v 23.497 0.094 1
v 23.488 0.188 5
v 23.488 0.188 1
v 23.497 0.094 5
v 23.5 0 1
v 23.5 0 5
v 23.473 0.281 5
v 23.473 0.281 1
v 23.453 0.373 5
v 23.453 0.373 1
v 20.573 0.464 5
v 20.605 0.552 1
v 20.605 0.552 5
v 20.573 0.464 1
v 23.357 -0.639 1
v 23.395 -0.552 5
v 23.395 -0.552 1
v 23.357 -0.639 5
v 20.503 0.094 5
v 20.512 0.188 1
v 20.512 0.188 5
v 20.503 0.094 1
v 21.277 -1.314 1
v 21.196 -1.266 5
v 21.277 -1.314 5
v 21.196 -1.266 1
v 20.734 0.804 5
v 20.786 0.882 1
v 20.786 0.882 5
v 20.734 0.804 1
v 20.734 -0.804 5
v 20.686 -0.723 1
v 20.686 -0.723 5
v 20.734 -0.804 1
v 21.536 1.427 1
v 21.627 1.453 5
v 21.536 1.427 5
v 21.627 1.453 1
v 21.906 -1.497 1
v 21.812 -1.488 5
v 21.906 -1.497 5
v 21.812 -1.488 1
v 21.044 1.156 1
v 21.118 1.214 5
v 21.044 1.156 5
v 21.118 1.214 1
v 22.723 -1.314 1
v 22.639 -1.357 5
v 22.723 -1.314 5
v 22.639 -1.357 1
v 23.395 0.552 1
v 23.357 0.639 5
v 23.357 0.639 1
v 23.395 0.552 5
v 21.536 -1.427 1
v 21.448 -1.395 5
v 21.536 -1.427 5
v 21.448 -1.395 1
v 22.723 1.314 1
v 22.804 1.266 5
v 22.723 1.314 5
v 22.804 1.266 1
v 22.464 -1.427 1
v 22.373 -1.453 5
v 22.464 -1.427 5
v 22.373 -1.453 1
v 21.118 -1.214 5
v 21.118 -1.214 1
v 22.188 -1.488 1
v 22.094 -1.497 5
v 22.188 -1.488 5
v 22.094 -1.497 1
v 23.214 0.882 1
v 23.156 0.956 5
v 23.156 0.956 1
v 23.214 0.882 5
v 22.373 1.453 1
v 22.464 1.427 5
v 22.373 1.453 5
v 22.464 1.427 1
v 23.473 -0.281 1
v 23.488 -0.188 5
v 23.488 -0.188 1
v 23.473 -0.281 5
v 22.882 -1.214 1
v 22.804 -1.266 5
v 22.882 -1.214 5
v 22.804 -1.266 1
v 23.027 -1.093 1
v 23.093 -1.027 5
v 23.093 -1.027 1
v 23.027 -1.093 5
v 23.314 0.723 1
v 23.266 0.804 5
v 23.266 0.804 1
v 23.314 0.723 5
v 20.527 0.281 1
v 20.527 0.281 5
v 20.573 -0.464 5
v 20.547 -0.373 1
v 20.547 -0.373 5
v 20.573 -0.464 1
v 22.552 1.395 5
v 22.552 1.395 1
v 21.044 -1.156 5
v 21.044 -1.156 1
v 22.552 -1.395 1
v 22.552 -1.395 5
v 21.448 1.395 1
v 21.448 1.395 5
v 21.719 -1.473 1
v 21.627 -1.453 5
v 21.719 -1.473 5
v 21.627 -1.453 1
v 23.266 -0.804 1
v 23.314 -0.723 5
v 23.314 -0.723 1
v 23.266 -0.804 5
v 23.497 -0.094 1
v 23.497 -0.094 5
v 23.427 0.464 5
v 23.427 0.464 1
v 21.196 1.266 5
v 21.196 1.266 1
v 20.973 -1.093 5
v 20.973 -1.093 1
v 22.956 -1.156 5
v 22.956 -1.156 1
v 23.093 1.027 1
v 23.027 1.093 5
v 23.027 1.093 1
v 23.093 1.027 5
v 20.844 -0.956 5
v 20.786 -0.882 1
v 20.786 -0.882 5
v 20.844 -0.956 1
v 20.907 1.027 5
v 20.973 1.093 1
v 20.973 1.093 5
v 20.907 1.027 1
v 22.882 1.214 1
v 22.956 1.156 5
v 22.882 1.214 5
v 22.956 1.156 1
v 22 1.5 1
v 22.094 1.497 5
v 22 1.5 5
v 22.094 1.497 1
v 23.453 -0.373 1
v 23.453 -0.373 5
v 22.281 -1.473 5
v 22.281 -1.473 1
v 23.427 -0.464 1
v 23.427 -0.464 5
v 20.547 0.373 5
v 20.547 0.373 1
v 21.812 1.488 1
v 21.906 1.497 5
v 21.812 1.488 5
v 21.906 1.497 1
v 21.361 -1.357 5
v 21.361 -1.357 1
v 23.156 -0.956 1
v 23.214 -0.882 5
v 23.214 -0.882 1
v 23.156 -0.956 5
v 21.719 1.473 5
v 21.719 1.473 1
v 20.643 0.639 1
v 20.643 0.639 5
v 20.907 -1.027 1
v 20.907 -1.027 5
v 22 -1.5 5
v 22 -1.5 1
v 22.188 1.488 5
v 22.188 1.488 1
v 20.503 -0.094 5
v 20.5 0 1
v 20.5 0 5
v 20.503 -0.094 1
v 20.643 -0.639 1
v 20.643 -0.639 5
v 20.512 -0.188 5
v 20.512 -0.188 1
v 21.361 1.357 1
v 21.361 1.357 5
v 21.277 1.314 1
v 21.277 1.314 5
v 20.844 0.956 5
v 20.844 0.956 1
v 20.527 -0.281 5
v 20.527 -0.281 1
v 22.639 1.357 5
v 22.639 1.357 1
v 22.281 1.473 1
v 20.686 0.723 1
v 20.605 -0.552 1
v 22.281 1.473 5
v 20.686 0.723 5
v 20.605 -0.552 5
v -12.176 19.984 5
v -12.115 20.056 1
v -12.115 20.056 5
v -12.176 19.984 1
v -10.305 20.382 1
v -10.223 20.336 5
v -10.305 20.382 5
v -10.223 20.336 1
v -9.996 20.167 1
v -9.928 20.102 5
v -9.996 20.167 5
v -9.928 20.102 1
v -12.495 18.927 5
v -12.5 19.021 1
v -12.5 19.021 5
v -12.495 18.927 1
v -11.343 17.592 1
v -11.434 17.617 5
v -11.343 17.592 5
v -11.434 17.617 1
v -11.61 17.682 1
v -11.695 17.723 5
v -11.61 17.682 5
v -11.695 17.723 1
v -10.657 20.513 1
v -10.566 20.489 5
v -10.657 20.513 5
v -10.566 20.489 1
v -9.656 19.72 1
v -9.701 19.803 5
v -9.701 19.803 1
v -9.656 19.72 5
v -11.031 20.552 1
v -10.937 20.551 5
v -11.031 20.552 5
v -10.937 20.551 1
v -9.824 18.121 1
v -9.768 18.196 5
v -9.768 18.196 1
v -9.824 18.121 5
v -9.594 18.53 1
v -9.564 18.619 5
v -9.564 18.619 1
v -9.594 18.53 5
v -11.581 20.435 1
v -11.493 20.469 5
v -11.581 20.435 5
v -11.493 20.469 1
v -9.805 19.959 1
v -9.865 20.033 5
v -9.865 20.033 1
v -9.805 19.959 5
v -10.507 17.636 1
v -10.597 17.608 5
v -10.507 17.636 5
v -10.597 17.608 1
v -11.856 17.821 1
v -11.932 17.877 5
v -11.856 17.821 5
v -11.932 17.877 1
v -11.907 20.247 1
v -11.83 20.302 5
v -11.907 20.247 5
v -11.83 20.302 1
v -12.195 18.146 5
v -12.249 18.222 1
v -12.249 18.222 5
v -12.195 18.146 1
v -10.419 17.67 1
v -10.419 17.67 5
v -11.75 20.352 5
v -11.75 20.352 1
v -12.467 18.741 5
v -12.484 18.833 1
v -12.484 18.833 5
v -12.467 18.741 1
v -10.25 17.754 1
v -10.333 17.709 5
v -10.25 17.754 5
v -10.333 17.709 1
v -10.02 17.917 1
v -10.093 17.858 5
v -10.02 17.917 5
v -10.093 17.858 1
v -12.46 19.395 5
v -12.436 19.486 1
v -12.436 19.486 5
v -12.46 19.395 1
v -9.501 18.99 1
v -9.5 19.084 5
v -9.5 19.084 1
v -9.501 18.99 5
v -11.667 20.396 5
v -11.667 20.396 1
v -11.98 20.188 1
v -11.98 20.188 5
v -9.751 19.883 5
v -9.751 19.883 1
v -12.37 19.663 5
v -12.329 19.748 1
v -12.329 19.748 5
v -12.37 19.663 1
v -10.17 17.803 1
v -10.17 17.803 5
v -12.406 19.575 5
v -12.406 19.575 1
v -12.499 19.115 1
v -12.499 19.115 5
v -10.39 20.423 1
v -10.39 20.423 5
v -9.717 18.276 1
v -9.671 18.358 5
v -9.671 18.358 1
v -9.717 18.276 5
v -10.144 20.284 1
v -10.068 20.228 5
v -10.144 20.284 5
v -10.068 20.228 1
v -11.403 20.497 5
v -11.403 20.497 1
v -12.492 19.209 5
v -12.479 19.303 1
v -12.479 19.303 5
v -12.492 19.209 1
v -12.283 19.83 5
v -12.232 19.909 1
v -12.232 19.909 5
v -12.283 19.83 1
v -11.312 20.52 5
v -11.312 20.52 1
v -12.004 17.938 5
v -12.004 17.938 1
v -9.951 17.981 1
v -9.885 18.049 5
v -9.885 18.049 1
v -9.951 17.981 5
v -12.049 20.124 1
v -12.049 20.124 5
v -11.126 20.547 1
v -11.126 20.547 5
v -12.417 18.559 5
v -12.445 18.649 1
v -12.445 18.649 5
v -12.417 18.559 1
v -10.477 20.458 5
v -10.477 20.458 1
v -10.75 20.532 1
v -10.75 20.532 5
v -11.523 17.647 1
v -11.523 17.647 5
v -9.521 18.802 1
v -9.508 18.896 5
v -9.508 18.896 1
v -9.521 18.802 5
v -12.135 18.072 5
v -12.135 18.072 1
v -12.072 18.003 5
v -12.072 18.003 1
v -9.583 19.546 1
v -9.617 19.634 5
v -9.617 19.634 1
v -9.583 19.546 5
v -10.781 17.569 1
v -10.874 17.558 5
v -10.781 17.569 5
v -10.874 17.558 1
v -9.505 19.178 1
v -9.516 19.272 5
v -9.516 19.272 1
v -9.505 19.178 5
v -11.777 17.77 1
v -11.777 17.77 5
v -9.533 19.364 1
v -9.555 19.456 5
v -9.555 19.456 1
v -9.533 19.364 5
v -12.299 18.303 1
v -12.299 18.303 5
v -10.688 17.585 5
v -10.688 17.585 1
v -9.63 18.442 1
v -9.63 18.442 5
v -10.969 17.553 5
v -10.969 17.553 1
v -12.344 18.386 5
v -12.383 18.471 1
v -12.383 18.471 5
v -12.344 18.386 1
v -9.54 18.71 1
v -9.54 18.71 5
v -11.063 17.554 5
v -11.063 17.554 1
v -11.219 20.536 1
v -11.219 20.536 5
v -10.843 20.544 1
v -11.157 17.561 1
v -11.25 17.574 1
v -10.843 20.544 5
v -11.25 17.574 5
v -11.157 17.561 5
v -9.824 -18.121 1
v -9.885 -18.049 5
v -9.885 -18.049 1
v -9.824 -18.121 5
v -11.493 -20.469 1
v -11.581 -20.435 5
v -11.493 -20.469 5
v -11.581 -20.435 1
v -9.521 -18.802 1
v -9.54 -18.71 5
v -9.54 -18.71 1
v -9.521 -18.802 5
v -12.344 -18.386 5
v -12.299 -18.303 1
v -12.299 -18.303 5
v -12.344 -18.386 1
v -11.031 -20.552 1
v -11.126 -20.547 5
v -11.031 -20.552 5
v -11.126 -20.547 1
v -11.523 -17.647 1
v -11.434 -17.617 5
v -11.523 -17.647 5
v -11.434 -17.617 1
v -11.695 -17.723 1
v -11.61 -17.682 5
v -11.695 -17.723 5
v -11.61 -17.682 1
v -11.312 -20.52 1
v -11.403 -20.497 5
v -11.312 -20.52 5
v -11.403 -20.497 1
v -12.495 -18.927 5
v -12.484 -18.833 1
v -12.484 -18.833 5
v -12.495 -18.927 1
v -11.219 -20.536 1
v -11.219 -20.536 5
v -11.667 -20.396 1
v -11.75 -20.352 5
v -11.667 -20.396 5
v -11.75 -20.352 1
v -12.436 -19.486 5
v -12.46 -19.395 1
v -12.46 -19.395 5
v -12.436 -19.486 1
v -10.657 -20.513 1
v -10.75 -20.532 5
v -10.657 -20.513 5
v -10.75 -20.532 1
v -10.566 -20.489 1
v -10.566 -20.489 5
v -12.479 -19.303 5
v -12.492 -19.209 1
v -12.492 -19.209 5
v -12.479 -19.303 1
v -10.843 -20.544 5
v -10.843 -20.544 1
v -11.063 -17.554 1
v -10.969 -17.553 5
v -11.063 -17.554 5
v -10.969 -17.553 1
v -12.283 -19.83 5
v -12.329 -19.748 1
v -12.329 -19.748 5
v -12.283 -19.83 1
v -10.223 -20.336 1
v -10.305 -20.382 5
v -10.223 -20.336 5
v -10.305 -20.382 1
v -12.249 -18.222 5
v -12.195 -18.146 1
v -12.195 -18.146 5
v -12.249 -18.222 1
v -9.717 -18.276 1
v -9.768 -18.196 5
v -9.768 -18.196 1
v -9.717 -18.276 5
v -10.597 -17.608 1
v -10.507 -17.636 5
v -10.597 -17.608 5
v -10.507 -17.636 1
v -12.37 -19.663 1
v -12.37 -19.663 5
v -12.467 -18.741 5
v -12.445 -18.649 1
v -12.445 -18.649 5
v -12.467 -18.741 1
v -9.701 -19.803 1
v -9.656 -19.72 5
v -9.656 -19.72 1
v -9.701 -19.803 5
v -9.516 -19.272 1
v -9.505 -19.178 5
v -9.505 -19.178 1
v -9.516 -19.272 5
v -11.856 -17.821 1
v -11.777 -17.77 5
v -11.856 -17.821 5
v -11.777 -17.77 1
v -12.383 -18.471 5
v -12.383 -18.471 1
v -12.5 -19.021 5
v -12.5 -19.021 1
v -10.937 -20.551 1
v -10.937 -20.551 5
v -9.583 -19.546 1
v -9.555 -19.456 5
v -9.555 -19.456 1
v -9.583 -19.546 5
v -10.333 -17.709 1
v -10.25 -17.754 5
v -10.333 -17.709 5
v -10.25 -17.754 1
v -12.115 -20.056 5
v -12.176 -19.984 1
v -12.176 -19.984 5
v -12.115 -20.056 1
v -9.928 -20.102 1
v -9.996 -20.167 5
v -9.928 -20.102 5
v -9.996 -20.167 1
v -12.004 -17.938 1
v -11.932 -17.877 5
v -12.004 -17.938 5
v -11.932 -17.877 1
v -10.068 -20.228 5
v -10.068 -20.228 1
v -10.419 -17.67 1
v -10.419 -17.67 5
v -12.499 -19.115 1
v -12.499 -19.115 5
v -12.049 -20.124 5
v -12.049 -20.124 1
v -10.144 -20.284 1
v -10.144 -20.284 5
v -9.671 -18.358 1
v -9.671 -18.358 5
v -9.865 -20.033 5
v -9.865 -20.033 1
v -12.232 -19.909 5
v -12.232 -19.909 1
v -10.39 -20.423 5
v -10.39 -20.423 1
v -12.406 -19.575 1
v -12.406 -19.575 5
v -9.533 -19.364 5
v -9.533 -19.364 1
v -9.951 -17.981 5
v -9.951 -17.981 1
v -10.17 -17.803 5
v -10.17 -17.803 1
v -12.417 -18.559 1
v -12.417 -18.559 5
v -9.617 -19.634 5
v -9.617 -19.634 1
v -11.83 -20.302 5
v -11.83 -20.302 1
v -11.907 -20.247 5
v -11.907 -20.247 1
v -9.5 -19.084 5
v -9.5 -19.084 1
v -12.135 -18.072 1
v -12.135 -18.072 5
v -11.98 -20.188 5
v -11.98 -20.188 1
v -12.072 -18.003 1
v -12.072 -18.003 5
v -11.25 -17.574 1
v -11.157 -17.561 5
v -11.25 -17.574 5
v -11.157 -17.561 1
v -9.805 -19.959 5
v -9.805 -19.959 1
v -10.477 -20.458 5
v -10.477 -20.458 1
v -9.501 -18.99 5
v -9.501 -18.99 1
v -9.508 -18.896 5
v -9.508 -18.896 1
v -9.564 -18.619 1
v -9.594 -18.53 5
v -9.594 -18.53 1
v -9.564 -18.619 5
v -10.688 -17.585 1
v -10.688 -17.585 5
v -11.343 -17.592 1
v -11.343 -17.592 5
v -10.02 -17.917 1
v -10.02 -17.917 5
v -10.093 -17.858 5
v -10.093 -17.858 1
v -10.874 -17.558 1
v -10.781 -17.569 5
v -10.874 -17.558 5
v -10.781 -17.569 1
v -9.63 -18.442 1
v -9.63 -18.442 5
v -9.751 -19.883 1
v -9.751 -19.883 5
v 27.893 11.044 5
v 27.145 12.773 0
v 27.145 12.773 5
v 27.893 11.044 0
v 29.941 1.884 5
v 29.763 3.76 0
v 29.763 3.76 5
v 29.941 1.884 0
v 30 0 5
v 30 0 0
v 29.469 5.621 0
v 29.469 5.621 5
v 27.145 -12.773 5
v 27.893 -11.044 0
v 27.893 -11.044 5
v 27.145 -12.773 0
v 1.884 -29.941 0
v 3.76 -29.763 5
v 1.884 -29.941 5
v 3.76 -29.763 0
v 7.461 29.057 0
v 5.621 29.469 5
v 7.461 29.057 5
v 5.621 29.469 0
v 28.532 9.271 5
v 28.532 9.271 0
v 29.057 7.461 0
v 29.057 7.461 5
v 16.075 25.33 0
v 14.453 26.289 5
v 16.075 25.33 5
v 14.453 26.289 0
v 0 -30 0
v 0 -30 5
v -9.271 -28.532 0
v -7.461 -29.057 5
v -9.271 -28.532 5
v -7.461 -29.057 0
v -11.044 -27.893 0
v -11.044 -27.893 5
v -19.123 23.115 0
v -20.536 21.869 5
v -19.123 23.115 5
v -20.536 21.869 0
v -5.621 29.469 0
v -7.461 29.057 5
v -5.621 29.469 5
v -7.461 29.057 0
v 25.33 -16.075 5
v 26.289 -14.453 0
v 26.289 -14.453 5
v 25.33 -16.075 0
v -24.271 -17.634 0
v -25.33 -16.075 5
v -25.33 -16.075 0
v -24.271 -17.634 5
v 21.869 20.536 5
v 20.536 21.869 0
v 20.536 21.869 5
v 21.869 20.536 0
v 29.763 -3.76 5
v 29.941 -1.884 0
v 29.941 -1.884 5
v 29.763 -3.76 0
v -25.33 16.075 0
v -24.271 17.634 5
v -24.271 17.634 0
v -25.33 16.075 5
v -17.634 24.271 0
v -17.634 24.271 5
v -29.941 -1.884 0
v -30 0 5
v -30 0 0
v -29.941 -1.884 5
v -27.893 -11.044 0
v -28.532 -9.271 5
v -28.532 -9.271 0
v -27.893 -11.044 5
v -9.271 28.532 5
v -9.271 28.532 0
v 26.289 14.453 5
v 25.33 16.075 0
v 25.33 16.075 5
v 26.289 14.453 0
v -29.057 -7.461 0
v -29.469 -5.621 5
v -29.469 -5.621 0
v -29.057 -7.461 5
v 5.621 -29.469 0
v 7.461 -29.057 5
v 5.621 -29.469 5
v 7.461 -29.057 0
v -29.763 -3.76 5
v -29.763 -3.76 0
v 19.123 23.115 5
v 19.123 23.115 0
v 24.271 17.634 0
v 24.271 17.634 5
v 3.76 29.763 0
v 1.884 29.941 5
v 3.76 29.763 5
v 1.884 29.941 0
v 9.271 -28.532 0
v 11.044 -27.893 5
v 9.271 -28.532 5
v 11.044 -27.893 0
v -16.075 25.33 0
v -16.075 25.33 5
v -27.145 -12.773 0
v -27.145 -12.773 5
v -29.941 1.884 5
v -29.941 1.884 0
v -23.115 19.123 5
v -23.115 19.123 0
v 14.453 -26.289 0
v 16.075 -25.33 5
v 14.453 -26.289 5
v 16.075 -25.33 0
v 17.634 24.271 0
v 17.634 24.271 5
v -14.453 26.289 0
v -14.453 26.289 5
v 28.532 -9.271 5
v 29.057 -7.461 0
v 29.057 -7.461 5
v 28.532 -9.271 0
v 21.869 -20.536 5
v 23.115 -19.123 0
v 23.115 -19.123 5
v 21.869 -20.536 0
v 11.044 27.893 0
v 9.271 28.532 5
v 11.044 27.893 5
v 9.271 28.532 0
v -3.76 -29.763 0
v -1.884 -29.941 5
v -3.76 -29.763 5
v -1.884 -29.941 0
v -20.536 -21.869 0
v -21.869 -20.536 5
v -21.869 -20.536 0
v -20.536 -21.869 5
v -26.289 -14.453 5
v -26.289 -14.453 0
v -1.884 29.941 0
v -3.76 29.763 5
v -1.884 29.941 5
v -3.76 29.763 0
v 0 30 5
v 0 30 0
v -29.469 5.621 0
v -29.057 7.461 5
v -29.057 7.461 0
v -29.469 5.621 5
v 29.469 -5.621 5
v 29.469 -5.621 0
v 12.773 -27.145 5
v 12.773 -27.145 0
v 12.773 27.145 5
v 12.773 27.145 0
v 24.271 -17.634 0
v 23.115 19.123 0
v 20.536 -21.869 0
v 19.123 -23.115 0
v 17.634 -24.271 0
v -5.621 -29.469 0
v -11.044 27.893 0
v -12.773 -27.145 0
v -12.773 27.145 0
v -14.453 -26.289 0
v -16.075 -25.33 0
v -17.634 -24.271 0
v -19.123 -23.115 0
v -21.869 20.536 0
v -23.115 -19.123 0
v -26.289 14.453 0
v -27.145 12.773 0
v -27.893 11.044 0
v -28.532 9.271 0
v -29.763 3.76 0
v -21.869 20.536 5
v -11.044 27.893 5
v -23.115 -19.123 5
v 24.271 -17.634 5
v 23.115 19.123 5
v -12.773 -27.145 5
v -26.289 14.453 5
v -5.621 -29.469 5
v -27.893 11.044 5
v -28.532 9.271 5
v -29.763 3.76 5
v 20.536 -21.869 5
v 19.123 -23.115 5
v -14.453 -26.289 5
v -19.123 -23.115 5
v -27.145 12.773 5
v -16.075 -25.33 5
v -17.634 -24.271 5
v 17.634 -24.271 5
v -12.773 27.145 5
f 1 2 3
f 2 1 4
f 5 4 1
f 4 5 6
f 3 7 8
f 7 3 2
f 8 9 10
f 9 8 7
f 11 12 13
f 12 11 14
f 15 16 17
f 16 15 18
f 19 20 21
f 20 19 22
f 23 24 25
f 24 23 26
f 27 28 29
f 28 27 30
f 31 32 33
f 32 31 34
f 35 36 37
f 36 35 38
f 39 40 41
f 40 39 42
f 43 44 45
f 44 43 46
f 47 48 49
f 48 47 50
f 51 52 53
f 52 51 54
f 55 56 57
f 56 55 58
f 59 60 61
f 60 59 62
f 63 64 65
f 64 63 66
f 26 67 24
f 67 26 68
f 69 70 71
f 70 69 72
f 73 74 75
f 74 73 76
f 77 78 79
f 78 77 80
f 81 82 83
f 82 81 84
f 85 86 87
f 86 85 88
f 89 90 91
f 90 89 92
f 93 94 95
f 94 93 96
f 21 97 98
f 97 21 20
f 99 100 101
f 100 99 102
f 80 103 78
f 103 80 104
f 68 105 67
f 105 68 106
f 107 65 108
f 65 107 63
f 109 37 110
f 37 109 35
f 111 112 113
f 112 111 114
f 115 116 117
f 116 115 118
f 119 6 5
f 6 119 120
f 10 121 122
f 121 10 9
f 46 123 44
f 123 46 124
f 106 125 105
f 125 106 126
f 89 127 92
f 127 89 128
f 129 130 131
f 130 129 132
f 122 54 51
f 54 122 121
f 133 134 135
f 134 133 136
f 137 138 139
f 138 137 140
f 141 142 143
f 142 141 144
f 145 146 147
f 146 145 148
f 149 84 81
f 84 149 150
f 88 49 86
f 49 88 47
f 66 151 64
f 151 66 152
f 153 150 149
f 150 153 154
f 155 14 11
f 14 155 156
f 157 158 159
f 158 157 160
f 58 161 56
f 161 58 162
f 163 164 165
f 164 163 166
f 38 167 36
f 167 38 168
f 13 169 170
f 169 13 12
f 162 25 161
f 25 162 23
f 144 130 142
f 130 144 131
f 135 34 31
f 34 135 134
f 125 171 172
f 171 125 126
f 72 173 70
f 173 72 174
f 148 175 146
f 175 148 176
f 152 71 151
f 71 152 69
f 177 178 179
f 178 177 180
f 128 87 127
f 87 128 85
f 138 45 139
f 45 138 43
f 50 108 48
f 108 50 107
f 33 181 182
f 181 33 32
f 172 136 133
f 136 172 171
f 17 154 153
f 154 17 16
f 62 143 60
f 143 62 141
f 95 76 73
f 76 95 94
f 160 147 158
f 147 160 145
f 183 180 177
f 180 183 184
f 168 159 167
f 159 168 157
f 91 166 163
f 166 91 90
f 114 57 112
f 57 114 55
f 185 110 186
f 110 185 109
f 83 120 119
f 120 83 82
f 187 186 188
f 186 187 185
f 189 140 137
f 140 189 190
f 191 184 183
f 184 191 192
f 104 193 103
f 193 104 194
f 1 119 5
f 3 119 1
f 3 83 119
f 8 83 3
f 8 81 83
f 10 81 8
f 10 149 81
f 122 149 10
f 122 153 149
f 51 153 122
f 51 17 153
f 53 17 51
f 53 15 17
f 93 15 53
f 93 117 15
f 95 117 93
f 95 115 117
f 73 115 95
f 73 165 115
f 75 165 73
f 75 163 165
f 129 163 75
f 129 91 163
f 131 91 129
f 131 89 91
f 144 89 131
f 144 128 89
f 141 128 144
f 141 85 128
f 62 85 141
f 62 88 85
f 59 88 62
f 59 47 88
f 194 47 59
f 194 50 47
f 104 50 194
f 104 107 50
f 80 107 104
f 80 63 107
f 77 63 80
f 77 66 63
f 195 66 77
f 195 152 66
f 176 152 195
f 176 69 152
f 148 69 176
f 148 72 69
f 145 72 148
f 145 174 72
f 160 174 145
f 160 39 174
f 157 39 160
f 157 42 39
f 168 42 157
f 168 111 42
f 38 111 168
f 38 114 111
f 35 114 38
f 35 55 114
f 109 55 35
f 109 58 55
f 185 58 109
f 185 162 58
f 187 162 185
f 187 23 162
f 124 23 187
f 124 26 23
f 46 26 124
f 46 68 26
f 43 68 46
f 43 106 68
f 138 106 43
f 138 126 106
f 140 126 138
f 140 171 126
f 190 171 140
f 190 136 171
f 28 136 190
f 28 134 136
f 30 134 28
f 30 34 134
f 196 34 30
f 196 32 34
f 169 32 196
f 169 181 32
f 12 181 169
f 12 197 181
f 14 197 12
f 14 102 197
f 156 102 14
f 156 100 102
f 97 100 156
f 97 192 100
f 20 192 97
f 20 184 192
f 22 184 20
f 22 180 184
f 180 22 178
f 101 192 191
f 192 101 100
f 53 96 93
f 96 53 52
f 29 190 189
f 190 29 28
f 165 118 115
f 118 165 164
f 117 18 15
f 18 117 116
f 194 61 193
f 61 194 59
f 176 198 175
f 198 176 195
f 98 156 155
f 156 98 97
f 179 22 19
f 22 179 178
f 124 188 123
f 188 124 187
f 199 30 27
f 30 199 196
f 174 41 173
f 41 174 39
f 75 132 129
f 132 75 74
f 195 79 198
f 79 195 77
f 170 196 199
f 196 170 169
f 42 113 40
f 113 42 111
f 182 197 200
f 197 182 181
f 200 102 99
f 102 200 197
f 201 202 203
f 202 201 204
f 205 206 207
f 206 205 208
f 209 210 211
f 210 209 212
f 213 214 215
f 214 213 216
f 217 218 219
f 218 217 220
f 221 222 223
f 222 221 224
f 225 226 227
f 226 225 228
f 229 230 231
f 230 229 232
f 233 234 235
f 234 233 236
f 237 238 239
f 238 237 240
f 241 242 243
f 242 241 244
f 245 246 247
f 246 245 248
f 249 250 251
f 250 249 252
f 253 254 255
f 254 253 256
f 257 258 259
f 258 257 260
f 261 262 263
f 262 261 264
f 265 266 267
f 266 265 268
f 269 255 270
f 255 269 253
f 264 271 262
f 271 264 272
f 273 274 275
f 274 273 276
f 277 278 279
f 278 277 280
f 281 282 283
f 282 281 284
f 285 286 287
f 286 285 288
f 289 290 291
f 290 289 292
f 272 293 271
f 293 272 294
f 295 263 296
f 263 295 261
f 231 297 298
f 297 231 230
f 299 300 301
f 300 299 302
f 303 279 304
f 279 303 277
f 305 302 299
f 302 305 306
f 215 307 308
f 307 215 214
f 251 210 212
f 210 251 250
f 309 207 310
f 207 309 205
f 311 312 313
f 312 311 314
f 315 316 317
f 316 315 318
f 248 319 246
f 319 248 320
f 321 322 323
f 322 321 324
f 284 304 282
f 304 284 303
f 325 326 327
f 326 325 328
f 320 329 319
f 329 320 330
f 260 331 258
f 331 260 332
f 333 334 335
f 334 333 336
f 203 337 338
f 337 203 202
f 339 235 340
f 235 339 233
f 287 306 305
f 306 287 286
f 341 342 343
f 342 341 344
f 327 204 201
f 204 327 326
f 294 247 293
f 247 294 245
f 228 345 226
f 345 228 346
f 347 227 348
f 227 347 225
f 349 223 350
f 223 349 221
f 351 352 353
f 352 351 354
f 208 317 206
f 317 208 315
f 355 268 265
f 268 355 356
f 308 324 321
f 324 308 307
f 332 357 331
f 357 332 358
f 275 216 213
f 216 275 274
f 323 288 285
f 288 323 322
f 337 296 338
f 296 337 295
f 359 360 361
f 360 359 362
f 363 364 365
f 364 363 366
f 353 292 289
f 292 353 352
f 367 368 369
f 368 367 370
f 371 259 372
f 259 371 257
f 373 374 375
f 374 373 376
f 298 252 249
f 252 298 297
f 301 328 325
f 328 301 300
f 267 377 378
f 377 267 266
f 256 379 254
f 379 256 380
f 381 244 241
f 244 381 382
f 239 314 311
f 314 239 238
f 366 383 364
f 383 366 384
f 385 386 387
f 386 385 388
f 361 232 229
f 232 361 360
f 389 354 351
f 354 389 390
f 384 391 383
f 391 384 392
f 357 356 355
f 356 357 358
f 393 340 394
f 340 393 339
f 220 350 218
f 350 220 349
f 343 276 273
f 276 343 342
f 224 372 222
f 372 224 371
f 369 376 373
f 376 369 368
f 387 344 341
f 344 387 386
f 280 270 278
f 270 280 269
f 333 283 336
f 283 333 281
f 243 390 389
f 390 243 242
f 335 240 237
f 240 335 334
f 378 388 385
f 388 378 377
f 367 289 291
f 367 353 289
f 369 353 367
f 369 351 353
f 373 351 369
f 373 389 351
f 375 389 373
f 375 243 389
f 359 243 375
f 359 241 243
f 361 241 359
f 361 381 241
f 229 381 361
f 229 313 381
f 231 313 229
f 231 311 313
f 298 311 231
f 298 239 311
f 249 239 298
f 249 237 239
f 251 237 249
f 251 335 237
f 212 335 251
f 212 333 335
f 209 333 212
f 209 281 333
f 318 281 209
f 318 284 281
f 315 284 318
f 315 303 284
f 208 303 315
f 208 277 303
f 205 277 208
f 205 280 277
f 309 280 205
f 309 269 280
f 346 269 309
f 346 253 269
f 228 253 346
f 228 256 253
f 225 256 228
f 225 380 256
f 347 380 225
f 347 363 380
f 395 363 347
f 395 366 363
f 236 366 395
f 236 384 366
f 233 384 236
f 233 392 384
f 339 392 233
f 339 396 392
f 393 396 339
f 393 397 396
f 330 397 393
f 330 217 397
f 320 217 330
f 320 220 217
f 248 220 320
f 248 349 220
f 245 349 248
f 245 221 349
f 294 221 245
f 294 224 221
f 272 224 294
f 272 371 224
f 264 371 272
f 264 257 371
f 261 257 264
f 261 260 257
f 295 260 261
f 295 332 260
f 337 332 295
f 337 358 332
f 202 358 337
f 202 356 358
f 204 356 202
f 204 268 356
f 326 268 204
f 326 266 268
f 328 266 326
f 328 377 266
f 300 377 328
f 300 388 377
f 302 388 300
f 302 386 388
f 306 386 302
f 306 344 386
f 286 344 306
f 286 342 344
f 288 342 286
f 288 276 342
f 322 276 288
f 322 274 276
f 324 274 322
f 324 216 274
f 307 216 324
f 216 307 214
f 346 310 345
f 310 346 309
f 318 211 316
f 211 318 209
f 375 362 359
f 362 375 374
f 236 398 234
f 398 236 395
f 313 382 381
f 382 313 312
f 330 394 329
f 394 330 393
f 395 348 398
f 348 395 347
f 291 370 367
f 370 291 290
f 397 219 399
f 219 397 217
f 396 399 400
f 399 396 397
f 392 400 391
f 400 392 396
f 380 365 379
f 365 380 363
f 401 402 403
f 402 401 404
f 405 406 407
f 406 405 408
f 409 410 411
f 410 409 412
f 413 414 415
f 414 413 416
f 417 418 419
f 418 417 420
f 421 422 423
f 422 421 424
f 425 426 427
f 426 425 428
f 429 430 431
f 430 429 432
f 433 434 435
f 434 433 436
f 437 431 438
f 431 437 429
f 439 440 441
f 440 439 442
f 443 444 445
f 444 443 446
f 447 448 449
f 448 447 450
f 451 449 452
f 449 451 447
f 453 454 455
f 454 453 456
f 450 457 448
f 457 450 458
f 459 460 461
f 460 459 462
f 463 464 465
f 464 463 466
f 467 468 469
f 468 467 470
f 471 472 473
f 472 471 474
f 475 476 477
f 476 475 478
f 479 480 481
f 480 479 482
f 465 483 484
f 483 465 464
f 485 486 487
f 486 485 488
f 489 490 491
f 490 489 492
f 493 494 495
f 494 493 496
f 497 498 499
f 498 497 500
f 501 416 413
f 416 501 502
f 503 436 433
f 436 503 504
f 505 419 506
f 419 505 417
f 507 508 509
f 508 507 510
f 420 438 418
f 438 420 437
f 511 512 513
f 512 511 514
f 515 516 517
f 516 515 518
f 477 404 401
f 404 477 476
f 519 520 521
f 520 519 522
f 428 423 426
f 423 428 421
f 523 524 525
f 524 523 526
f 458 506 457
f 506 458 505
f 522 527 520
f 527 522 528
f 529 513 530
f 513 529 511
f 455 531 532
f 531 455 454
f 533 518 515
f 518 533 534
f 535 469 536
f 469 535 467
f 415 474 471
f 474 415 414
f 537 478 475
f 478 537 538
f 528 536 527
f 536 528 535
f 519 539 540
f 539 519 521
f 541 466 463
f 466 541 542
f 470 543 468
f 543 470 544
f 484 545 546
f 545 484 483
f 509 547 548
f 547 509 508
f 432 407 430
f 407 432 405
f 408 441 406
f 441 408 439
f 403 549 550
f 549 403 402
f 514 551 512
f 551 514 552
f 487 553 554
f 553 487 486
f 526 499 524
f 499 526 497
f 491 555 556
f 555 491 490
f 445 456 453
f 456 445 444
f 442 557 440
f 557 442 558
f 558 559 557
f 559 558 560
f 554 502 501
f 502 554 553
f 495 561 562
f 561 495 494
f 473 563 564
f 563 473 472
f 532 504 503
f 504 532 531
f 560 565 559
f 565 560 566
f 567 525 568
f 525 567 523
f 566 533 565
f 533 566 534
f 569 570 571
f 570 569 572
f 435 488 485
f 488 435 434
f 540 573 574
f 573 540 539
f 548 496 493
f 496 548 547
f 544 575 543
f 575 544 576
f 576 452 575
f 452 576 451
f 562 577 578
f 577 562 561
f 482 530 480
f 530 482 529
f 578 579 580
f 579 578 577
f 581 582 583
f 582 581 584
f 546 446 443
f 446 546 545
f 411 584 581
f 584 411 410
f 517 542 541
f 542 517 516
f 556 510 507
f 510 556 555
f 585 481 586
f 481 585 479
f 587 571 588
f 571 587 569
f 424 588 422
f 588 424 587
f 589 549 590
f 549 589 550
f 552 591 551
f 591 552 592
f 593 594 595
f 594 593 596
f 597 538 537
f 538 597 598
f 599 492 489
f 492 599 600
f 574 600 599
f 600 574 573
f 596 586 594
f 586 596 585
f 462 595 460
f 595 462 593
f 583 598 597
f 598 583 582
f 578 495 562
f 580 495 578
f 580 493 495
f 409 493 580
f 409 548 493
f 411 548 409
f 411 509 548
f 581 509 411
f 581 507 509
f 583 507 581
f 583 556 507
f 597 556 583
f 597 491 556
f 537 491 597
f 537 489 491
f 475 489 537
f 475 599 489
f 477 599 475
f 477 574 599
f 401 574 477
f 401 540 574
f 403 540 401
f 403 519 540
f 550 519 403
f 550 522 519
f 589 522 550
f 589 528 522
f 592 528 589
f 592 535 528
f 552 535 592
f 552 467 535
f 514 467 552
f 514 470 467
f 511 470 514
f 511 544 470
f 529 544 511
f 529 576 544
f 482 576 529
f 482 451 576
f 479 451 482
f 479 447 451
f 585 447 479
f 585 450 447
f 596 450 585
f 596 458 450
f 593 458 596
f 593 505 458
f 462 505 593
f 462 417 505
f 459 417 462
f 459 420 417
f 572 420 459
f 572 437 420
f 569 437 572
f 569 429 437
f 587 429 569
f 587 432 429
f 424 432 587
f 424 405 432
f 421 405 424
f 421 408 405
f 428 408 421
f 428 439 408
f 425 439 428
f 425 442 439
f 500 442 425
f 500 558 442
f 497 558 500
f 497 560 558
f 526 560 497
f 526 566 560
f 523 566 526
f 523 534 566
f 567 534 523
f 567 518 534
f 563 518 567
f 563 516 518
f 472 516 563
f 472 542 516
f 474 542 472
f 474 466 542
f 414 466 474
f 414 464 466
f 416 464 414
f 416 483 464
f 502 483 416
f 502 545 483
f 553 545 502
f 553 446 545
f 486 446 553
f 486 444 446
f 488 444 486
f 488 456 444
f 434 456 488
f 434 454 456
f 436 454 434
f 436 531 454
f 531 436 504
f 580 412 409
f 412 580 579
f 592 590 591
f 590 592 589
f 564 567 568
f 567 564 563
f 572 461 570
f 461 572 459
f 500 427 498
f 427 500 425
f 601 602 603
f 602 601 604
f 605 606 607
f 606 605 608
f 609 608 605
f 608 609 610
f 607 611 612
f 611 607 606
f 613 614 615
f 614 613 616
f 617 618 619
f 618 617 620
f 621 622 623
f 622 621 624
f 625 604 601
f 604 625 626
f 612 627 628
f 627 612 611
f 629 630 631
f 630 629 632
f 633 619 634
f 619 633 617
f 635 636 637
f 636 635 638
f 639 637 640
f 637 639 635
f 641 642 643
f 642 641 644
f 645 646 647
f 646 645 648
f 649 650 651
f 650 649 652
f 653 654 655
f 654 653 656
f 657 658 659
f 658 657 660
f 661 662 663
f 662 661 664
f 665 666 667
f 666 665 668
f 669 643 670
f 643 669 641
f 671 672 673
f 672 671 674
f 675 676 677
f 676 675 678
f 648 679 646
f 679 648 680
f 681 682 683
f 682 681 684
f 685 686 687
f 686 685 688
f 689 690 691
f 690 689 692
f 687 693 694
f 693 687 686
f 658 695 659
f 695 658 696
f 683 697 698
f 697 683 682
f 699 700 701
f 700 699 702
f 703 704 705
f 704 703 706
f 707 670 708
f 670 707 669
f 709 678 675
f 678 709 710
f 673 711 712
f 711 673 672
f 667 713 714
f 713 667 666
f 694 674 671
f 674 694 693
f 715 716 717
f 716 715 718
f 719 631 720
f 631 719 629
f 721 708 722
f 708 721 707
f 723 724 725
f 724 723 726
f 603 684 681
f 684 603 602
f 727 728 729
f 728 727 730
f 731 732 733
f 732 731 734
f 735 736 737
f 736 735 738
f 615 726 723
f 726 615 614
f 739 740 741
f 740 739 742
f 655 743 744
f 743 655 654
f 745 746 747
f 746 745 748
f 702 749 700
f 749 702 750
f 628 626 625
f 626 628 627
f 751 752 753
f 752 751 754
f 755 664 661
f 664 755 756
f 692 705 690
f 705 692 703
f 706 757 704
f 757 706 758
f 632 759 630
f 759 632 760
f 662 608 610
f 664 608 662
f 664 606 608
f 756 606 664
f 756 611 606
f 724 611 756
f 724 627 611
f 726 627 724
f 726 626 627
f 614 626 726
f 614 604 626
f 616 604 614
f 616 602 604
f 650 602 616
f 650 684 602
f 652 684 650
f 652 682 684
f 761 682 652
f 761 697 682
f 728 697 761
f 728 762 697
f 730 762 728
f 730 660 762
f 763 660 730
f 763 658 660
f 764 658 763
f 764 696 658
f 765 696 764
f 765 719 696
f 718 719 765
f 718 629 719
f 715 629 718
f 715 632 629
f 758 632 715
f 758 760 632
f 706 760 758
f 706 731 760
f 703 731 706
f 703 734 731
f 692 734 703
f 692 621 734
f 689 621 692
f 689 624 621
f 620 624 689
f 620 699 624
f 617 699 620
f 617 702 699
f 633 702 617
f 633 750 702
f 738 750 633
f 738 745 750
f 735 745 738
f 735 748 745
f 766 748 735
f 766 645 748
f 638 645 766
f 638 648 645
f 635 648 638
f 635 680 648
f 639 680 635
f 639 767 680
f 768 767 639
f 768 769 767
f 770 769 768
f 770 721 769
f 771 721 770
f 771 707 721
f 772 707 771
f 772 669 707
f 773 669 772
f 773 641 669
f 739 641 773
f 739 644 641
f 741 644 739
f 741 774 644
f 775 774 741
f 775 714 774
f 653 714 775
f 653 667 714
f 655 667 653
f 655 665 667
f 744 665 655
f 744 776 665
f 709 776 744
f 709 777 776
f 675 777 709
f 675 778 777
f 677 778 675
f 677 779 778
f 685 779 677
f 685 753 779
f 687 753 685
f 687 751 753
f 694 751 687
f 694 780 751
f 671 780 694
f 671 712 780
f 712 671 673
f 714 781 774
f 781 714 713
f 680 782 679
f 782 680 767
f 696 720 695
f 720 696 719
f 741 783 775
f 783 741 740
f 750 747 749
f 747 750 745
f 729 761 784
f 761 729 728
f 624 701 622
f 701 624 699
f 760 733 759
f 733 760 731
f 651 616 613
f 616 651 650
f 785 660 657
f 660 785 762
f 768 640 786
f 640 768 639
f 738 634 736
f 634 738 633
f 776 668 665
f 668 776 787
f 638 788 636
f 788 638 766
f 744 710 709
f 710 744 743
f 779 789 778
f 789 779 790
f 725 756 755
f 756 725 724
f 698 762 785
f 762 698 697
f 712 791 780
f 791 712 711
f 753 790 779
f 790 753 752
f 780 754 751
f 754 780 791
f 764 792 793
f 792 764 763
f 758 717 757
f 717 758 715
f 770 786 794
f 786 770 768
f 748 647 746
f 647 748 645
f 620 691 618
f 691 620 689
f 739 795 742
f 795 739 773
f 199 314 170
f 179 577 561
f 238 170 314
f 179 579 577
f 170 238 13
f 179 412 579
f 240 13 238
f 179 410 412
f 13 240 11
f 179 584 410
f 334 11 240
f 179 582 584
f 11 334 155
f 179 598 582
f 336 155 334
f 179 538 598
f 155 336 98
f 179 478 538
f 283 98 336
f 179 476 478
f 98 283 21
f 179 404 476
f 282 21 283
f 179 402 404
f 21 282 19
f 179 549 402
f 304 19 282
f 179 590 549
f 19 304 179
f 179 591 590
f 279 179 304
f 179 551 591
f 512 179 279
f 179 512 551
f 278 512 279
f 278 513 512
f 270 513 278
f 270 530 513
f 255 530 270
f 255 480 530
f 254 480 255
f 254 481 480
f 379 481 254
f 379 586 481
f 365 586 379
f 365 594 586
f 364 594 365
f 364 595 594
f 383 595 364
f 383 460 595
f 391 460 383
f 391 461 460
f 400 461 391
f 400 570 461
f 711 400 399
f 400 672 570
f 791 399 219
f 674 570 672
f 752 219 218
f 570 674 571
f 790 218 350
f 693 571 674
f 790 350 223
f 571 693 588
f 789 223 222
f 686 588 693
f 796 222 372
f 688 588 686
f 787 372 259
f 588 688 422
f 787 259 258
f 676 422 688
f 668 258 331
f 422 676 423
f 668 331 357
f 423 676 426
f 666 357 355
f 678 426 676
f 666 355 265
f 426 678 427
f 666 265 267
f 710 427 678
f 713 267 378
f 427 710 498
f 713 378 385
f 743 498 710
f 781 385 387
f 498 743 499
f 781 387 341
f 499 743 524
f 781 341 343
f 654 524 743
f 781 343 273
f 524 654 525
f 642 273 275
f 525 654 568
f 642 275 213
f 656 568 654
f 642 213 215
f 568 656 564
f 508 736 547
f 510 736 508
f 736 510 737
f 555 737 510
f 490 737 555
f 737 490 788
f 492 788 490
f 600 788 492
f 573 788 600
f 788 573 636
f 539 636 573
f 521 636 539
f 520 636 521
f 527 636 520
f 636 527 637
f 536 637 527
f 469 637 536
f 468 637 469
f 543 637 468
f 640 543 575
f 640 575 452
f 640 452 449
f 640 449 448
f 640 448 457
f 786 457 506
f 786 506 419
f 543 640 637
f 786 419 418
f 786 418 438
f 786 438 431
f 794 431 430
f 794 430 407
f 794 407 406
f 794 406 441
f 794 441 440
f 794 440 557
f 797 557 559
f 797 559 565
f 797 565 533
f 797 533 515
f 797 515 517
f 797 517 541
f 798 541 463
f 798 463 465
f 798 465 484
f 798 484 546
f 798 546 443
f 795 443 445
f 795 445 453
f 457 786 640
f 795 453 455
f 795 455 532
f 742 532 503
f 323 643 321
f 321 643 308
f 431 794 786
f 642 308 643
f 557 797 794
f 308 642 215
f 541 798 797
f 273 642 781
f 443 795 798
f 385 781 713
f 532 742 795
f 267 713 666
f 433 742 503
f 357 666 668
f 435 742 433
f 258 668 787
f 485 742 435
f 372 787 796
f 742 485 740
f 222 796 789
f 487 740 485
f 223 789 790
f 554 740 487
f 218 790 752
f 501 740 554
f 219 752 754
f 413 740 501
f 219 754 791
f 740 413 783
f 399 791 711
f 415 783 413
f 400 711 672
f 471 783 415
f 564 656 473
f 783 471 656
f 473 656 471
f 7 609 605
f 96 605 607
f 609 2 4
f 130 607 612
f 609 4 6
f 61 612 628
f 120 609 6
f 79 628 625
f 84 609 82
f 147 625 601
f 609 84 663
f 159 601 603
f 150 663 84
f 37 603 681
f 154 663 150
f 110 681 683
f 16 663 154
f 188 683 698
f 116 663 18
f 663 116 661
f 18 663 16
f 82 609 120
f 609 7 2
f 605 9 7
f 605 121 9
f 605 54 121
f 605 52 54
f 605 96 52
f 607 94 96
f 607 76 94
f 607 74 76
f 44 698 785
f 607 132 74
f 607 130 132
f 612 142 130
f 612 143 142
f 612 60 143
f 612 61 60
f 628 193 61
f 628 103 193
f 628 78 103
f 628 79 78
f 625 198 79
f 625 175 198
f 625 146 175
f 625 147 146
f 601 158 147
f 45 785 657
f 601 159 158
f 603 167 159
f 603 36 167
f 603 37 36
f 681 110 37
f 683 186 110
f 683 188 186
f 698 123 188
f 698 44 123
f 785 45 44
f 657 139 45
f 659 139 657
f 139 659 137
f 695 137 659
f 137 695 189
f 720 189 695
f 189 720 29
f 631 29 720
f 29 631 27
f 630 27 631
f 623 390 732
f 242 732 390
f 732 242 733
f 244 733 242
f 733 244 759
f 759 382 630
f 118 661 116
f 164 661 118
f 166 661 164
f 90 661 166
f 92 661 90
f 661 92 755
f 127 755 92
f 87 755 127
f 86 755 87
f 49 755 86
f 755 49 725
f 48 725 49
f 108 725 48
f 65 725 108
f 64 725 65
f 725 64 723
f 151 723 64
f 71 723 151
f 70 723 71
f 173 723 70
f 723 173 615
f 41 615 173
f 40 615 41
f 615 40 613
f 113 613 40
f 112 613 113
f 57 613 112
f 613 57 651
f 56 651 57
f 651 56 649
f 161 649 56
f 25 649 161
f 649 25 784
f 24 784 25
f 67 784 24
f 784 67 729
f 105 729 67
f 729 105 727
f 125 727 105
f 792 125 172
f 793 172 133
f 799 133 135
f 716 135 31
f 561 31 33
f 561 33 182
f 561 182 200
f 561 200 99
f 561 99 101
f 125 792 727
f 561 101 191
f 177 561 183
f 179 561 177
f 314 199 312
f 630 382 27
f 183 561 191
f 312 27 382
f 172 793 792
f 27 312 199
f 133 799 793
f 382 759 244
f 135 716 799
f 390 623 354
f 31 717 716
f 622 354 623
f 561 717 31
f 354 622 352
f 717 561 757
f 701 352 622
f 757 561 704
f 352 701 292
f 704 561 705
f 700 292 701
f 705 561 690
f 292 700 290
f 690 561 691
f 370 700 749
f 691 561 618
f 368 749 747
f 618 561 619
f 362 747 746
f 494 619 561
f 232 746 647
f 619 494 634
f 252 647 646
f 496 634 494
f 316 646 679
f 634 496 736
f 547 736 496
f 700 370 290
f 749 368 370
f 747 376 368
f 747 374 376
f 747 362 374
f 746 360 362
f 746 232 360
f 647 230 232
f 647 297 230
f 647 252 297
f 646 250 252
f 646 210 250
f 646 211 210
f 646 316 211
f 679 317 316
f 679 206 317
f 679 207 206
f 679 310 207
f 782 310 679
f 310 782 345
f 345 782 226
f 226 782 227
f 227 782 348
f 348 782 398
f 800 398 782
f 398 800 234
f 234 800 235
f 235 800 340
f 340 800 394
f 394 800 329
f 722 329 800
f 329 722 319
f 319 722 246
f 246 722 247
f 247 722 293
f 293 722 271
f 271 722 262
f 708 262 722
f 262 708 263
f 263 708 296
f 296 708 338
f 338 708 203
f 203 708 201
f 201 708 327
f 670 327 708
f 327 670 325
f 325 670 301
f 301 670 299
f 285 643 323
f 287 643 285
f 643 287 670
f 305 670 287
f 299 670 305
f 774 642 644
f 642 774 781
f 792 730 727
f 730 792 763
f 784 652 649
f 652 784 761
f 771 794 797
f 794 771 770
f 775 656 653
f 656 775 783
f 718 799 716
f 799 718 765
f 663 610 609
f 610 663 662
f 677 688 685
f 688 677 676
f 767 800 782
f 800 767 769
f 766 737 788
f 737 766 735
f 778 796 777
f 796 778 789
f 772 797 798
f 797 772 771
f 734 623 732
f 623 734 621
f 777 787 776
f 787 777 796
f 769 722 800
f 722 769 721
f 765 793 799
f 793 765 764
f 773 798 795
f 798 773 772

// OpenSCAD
$fn = 100;

difference() {
  cylinder(d1=60, d2=60, h=5);
  for (a = [0:3]) {
    rotate([0, 0, a * 120]) translate([22, 0, 1]) cylinder(d=3, h=6);
  }
}
